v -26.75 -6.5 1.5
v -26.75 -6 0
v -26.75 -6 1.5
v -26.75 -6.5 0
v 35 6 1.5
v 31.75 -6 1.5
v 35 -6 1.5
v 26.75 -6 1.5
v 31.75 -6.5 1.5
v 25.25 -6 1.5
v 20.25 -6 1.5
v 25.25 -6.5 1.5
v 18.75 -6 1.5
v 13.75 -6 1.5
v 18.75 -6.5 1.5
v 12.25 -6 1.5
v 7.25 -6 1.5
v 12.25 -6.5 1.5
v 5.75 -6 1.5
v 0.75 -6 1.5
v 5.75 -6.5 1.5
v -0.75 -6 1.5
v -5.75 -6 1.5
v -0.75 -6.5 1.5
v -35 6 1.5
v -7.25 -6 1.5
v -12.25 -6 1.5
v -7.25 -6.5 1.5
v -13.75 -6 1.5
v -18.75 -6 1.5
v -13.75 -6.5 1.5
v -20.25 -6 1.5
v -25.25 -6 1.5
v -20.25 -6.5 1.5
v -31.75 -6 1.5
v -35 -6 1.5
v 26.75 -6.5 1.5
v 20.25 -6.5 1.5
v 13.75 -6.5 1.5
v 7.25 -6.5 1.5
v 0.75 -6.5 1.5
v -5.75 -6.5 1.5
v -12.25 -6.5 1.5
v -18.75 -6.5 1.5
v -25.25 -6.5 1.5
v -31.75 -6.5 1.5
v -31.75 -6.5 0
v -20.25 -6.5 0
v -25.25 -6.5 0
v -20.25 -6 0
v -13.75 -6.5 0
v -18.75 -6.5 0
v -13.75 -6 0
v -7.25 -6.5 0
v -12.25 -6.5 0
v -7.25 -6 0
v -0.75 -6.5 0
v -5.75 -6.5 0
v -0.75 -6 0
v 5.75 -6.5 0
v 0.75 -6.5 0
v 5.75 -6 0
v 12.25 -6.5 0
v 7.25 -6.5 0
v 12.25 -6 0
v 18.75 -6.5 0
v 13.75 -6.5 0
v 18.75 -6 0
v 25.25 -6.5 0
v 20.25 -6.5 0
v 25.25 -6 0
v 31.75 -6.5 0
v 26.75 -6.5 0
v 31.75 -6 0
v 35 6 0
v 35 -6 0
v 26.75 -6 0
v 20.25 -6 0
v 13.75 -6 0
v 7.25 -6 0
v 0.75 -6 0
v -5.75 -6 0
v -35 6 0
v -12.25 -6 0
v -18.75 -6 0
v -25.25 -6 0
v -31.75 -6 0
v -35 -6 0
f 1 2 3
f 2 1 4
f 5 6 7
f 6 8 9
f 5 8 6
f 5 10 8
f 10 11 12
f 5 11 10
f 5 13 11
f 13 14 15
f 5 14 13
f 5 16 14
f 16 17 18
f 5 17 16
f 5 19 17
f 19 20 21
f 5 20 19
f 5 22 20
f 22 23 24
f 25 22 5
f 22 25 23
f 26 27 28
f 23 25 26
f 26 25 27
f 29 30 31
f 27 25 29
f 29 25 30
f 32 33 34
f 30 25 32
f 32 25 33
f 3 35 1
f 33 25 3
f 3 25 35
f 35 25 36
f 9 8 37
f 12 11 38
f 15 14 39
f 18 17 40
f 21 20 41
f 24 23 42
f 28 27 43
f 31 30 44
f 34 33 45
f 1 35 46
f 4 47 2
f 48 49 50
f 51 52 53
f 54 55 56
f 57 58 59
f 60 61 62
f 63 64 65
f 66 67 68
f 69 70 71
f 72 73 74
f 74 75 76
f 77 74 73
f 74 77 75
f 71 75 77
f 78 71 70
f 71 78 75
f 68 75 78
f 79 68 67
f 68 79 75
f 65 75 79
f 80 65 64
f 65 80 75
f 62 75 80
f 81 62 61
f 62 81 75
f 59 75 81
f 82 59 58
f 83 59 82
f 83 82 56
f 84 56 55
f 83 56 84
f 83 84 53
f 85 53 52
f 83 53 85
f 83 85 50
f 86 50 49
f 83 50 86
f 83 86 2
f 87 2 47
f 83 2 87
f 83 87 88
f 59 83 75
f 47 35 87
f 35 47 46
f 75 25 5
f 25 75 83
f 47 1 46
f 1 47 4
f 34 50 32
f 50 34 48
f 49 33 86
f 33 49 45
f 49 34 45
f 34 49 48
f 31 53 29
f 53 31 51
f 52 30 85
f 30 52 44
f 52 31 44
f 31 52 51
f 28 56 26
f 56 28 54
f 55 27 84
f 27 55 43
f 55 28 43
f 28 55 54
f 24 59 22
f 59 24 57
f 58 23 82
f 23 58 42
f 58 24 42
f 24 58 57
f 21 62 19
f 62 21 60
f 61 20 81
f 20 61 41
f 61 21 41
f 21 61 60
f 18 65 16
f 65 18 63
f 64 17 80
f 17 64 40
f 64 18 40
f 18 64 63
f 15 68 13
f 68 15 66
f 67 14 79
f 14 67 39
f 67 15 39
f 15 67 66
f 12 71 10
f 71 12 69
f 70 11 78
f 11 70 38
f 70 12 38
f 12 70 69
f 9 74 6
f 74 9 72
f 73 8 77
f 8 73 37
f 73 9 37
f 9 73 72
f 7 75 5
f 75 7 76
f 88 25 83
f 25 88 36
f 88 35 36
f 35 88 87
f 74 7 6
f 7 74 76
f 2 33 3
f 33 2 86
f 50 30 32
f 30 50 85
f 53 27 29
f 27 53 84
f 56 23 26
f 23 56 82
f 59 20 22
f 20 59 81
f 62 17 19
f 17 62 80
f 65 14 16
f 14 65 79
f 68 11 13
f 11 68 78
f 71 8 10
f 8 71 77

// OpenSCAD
// 10-well agarose gel comb
// Print orientation: flat on bed, teeth pointing down (-Y)

plate_t     = 1.5;   // plate thickness (Z)
spine_l     = 70;    // spine length (X)
spine_w     = 12;    // spine width (Y)
tooth_w     = 5.0;   // tooth width (X)
tooth_l     = 12;    // tooth length (Y)
tooth_count = 10;    // number of teeth
gap         = 1.5;   // gap between teeth (X)

pitch      = tooth_w + gap;          // centre-to-centre spacing
x_start    = -(tooth_count - 1) * pitch / 2;  // first tooth centre
overlap    = 0.5;                    // tooth embed into spine for a clean union

union() {
    // Spine (back bar)
    translate([-spine_l / 2, -spine_w / 2, 0])
        cube([spine_l, spine_w, plate_t]);

    // Teeth
    for (i = [0 : tooth_count - 1])
        translate([x_start + i * pitch - tooth_w / 2,
                   -spine_w / 2 - overlap,
                   0])
            cube([tooth_w, tooth_l + overlap, plate_t]);
}
